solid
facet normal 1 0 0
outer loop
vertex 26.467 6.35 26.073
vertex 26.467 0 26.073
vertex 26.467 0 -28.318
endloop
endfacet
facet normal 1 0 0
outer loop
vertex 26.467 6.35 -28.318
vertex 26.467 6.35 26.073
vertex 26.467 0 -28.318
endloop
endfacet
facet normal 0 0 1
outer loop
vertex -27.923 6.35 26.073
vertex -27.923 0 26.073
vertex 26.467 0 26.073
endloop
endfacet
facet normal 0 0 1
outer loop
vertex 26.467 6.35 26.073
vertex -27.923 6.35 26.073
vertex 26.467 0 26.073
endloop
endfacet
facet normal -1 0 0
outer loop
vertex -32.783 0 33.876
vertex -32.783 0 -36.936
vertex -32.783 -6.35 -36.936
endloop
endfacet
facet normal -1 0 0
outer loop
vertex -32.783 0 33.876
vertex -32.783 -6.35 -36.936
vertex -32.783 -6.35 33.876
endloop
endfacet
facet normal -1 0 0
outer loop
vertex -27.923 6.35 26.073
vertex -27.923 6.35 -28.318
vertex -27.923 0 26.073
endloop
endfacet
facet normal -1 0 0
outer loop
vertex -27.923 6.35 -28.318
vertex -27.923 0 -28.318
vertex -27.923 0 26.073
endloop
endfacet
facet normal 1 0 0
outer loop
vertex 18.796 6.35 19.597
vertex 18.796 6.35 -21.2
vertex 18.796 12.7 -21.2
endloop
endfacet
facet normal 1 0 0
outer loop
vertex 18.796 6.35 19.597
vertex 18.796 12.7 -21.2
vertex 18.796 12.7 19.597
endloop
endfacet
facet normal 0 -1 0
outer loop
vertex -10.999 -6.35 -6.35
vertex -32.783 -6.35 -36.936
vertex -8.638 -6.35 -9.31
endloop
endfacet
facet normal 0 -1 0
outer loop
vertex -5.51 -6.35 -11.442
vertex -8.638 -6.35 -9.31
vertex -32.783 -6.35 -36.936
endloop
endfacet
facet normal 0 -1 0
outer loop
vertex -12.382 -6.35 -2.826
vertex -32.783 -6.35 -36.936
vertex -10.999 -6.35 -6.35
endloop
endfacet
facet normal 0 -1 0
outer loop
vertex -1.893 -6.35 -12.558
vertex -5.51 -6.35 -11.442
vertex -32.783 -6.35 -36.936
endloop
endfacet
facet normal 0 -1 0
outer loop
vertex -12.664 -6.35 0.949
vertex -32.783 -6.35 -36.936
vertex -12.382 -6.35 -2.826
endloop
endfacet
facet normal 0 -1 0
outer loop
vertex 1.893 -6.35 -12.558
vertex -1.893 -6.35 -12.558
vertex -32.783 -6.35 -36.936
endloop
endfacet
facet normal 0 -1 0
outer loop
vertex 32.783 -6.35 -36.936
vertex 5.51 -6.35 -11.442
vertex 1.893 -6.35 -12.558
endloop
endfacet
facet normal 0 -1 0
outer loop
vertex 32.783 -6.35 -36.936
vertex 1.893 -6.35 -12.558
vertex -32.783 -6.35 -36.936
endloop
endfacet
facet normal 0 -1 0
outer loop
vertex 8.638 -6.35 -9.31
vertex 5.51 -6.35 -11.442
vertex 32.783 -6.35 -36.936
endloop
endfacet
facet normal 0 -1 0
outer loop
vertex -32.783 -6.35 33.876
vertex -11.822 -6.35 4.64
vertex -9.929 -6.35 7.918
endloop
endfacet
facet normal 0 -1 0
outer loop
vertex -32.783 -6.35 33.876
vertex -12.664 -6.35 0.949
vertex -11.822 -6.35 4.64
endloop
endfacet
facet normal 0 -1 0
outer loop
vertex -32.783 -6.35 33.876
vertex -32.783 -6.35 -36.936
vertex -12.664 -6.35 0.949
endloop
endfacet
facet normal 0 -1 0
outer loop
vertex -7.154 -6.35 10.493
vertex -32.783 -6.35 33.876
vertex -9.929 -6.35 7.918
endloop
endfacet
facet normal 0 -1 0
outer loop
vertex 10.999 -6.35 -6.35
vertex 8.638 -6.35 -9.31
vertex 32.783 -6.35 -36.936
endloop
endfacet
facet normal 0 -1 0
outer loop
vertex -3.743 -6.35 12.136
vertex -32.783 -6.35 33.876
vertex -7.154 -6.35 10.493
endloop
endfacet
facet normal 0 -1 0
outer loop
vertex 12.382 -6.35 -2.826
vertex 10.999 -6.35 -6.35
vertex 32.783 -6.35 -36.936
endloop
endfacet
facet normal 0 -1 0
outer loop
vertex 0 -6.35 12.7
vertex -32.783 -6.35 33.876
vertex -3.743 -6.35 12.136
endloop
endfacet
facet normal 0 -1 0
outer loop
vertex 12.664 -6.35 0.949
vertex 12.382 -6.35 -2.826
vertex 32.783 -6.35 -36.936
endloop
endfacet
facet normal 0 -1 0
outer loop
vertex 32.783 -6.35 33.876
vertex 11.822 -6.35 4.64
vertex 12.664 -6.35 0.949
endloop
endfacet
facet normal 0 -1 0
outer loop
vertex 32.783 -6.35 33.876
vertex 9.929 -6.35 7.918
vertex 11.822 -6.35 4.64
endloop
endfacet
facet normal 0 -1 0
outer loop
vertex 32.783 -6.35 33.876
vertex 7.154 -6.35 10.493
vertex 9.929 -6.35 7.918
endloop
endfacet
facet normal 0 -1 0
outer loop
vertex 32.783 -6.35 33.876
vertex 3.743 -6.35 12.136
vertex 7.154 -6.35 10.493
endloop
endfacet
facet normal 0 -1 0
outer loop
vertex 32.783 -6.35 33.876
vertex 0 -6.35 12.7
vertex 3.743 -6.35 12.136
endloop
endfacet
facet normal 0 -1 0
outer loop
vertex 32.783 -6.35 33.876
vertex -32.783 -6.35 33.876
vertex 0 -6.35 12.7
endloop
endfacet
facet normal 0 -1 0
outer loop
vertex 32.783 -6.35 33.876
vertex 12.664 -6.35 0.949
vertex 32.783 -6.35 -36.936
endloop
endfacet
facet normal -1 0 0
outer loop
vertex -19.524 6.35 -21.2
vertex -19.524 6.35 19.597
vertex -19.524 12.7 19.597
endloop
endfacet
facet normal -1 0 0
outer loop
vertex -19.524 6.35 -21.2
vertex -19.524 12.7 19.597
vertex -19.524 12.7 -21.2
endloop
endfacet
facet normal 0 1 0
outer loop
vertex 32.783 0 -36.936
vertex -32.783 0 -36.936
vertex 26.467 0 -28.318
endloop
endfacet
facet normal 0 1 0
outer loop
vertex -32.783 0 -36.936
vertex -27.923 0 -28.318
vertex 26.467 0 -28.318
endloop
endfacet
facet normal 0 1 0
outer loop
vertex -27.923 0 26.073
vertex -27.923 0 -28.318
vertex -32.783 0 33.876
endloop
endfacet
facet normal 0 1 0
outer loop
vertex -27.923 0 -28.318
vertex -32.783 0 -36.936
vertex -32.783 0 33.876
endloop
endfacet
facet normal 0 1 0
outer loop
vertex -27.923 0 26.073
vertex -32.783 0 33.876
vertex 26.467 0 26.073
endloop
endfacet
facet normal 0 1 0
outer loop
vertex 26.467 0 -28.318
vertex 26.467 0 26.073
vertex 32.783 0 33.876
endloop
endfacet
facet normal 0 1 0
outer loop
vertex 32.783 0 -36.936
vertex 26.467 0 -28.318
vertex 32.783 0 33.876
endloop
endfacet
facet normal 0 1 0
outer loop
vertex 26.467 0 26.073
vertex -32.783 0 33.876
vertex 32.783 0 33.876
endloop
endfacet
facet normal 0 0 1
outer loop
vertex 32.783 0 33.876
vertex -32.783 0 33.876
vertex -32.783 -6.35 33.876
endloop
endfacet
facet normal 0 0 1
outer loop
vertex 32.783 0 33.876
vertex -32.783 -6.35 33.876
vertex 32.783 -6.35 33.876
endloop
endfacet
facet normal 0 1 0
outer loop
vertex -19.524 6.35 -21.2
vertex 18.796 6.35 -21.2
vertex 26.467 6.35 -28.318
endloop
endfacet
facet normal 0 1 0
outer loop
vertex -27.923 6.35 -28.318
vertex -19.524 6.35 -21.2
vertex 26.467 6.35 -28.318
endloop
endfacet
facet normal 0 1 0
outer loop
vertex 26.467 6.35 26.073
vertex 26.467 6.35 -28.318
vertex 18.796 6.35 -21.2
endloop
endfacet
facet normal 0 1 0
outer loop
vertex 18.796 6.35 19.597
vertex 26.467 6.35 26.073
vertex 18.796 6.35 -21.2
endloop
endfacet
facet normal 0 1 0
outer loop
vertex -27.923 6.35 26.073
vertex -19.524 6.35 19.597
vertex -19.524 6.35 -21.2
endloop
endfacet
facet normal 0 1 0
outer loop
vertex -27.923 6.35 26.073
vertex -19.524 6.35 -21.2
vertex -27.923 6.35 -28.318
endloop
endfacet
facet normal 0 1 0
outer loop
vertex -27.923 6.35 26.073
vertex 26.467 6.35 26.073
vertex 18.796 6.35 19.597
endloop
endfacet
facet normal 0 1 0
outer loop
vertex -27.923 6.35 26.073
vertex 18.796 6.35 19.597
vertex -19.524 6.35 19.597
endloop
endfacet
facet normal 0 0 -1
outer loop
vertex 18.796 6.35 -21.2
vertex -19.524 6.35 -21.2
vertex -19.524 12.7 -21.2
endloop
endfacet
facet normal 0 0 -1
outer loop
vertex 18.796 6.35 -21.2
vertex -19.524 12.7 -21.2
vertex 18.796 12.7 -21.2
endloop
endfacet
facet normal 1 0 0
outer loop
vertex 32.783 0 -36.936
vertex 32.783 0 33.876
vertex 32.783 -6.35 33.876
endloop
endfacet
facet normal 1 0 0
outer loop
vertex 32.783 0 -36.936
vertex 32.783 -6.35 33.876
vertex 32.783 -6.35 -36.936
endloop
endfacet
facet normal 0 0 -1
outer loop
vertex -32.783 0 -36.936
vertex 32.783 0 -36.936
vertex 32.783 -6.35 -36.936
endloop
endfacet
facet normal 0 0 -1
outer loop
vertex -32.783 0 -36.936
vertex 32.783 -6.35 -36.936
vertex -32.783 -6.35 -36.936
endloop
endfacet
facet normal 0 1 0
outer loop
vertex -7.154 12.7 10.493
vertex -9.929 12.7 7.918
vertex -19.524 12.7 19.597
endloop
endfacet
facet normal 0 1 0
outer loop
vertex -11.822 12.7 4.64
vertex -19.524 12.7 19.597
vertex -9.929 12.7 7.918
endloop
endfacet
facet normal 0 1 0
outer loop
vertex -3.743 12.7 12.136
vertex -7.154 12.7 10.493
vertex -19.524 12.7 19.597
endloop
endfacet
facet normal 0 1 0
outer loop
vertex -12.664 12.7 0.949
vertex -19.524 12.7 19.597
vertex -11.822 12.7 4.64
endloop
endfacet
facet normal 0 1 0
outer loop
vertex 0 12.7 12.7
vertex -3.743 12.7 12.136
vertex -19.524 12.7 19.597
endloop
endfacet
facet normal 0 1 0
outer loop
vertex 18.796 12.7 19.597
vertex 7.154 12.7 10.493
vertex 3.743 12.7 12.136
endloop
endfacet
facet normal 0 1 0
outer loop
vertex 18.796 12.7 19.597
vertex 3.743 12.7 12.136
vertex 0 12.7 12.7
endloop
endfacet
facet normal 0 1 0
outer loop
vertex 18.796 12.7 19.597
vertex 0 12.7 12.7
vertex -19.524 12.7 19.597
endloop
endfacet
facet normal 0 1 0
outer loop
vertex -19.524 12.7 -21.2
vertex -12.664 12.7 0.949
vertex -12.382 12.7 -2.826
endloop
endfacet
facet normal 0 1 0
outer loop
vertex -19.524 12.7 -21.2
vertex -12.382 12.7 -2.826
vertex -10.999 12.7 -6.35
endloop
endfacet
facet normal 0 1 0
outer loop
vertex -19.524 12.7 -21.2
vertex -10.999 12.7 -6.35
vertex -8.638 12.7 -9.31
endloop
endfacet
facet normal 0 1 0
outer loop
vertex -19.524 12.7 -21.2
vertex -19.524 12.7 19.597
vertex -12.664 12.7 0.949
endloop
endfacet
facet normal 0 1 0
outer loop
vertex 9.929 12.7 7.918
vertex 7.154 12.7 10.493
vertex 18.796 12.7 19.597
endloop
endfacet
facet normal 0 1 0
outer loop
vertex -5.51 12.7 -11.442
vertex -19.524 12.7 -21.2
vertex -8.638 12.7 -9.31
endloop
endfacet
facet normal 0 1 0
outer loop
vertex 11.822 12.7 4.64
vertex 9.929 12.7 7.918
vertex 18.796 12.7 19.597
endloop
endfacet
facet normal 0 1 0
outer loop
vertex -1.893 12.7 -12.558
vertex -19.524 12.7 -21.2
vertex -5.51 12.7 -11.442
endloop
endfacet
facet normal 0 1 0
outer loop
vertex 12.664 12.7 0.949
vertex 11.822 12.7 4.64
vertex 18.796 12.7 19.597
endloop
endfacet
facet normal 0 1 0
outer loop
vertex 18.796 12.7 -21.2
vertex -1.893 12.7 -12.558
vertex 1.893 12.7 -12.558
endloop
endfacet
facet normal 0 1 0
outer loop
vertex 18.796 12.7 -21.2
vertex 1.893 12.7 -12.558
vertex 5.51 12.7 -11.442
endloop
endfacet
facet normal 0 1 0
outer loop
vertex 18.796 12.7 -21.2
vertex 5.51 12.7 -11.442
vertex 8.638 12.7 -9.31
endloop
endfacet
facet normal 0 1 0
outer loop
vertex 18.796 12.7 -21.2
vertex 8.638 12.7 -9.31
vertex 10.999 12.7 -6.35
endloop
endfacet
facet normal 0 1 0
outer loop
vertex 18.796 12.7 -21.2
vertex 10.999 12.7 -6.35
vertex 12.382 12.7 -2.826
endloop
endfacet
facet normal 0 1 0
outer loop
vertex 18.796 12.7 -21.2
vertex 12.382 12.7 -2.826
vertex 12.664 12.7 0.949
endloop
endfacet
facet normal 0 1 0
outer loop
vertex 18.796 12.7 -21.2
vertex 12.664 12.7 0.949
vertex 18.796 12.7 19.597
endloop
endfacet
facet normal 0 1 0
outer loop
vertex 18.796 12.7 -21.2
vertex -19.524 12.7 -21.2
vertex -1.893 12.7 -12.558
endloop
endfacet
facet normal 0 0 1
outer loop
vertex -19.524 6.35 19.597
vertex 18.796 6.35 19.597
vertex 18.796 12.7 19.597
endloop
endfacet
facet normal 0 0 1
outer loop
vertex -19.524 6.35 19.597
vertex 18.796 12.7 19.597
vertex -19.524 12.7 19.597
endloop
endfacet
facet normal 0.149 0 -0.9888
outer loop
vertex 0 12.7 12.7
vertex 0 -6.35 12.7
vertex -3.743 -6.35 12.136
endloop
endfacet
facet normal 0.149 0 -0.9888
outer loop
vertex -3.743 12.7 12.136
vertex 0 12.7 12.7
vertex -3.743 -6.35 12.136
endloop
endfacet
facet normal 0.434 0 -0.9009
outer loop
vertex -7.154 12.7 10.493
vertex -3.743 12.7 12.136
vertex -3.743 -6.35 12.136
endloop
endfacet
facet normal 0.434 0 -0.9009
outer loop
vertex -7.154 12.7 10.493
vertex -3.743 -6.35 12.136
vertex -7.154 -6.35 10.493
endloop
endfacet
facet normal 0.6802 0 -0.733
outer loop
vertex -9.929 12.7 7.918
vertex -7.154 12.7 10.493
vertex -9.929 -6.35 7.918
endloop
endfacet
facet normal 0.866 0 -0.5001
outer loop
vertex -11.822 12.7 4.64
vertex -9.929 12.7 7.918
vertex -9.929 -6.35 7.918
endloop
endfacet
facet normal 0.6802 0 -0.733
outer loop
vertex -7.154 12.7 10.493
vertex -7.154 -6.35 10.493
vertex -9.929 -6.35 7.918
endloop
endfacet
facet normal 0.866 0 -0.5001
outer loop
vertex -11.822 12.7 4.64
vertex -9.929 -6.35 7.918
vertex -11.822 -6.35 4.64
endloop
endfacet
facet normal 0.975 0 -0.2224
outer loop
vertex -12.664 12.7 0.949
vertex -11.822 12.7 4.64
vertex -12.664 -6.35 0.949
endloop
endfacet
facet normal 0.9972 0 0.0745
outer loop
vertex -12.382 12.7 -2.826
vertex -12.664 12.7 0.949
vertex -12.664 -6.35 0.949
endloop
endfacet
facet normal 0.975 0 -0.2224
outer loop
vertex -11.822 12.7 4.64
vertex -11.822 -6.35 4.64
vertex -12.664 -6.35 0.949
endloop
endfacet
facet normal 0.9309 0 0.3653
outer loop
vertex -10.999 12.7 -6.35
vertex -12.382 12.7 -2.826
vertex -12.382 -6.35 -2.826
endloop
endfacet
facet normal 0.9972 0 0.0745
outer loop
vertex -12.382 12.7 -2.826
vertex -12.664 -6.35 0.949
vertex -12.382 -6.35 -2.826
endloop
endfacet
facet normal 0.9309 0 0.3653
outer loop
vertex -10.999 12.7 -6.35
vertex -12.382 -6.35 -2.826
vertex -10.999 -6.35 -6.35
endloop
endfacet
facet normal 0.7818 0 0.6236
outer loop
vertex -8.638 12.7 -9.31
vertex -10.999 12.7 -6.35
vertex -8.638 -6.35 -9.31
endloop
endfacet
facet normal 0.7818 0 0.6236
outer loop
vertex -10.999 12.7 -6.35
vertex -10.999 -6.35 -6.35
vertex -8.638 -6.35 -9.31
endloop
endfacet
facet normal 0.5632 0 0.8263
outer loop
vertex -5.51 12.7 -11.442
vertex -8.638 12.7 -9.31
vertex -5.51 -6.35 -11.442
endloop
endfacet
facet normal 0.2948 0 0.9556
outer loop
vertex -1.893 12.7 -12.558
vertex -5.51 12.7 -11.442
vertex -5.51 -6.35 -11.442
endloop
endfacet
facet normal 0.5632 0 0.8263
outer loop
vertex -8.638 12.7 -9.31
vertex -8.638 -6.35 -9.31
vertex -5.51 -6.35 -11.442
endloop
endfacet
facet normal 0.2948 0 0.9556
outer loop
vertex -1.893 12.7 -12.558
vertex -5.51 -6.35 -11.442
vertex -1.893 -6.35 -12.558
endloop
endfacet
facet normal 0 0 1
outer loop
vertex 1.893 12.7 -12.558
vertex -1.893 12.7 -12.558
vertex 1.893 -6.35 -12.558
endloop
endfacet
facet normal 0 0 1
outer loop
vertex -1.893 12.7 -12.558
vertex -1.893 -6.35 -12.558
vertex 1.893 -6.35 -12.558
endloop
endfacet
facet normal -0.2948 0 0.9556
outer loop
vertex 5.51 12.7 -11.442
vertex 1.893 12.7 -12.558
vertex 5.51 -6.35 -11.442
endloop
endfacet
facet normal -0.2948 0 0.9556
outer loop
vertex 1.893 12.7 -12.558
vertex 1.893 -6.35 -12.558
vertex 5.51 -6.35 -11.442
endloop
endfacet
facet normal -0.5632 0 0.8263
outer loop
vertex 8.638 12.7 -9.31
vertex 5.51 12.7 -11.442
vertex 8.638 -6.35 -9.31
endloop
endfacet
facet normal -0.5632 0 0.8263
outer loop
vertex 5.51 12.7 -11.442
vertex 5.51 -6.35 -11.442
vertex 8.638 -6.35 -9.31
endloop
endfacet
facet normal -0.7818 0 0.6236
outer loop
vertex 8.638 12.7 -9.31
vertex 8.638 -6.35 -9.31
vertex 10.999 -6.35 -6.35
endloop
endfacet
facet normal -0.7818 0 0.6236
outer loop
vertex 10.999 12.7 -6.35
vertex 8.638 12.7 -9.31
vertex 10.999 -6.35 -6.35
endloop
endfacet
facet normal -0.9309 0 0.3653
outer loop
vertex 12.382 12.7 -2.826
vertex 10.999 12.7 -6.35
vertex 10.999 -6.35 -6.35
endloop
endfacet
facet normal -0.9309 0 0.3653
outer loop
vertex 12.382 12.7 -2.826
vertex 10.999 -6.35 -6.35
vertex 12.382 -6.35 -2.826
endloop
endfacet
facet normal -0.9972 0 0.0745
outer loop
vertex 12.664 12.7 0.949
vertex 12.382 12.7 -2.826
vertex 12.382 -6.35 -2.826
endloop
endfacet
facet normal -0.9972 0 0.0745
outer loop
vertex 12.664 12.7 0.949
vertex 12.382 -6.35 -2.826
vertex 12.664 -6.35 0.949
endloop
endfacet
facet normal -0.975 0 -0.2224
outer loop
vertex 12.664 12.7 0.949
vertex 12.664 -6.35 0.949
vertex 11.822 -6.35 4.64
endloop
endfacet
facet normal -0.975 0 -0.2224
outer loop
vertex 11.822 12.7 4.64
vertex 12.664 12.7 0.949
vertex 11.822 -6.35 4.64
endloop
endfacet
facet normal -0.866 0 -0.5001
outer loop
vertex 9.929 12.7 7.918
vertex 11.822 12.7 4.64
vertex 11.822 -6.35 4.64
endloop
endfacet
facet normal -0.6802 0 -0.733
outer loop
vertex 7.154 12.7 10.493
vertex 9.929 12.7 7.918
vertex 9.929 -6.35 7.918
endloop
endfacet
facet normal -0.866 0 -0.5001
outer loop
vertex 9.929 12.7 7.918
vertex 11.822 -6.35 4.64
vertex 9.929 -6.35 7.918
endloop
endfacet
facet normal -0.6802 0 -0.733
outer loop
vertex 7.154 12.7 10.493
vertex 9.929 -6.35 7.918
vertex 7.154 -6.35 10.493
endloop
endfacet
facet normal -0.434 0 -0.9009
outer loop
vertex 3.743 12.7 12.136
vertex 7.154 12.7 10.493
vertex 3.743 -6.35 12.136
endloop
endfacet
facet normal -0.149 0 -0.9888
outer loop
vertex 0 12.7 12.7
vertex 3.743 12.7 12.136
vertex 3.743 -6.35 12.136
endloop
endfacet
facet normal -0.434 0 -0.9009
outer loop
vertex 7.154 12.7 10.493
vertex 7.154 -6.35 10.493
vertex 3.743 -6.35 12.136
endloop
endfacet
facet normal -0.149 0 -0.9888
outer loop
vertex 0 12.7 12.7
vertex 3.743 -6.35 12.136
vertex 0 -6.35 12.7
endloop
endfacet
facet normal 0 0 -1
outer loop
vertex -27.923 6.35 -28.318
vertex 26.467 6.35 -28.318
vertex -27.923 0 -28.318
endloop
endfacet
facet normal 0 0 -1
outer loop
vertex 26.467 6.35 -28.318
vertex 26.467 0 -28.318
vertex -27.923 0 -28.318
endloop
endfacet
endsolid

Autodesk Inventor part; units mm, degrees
ref_plane "YZ Plane" through (0, 0, 0) normal (1, 0, 0) x (0, 1, 0)
ref_plane "XZ Plane" through (0, 0, 0) normal (0, 1, 0) x (-1, 0, 0)
ref_plane "XY Plane" through (0, 0, 0) normal (0, 0, 1) x (1, 0, 0)
sketch "Sketch5" plane through (0, 0, 0) normal (0, 1, 0) x (-1, 0, 0)
  line L0 (27.9234, 26.0727) -> (-26.467, 26.0727)
  line L1 (-26.467, 26.0727) -> (-26.467, -28.3178)
  line L2 (-26.467, -28.3178) -> (27.9234, -28.3178)
  line L3 (27.9234, -28.3178) -> (27.9234, 26.0727)
  point P0 (0, 0)
extrude "Extrusion3" add sketch "Sketch5" along normal blind 6.35
sketch "Sketch6" plane through (0, 0, 0) normal (0, -1, 0) x (1, 0, 0)
  line L0 (-32.7834, 33.8762) -> (32.7834, 33.8762)
  line L1 (32.7834, 33.8762) -> (32.7834, -36.936)
  line L2 (32.7834, -36.936) -> (-32.7834, -36.936)
  line L3 (-32.7834, -36.936) -> (-32.7834, 33.8762)
  point P0 (0, 0)
extrude "Extrusion4" add sketch "Sketch6" along normal blind 6.35
sketch "Sketch7" plane through (0, 6.35, 0) normal (0, 1, 0) x (1, 0, 0)
  line L0 (-19.5244, 21.2) -> (18.7958, 21.2)
  line L1 (18.7958, 21.2) -> (18.7958, -19.5972)
  line L2 (18.7958, -19.5972) -> (-19.5244, -19.5972)
  line L3 (-19.5244, -19.5972) -> (-19.5244, 21.2)
  point P0 (0, 0)
extrude "Extrusion5" add sketch "Sketch7" along normal blind 6.35
sketch "Sketch8" plane through (0, 12.7, 0) normal (0, 1, 0) x (1, 0, 0)
  circle A0 centre (0, 0) radius 8.1896
hole "Hole1" at (0, 12.7, 0) direction (0, -1, 0) diameter 25.4 end through all
properties part number "1st part ever"
